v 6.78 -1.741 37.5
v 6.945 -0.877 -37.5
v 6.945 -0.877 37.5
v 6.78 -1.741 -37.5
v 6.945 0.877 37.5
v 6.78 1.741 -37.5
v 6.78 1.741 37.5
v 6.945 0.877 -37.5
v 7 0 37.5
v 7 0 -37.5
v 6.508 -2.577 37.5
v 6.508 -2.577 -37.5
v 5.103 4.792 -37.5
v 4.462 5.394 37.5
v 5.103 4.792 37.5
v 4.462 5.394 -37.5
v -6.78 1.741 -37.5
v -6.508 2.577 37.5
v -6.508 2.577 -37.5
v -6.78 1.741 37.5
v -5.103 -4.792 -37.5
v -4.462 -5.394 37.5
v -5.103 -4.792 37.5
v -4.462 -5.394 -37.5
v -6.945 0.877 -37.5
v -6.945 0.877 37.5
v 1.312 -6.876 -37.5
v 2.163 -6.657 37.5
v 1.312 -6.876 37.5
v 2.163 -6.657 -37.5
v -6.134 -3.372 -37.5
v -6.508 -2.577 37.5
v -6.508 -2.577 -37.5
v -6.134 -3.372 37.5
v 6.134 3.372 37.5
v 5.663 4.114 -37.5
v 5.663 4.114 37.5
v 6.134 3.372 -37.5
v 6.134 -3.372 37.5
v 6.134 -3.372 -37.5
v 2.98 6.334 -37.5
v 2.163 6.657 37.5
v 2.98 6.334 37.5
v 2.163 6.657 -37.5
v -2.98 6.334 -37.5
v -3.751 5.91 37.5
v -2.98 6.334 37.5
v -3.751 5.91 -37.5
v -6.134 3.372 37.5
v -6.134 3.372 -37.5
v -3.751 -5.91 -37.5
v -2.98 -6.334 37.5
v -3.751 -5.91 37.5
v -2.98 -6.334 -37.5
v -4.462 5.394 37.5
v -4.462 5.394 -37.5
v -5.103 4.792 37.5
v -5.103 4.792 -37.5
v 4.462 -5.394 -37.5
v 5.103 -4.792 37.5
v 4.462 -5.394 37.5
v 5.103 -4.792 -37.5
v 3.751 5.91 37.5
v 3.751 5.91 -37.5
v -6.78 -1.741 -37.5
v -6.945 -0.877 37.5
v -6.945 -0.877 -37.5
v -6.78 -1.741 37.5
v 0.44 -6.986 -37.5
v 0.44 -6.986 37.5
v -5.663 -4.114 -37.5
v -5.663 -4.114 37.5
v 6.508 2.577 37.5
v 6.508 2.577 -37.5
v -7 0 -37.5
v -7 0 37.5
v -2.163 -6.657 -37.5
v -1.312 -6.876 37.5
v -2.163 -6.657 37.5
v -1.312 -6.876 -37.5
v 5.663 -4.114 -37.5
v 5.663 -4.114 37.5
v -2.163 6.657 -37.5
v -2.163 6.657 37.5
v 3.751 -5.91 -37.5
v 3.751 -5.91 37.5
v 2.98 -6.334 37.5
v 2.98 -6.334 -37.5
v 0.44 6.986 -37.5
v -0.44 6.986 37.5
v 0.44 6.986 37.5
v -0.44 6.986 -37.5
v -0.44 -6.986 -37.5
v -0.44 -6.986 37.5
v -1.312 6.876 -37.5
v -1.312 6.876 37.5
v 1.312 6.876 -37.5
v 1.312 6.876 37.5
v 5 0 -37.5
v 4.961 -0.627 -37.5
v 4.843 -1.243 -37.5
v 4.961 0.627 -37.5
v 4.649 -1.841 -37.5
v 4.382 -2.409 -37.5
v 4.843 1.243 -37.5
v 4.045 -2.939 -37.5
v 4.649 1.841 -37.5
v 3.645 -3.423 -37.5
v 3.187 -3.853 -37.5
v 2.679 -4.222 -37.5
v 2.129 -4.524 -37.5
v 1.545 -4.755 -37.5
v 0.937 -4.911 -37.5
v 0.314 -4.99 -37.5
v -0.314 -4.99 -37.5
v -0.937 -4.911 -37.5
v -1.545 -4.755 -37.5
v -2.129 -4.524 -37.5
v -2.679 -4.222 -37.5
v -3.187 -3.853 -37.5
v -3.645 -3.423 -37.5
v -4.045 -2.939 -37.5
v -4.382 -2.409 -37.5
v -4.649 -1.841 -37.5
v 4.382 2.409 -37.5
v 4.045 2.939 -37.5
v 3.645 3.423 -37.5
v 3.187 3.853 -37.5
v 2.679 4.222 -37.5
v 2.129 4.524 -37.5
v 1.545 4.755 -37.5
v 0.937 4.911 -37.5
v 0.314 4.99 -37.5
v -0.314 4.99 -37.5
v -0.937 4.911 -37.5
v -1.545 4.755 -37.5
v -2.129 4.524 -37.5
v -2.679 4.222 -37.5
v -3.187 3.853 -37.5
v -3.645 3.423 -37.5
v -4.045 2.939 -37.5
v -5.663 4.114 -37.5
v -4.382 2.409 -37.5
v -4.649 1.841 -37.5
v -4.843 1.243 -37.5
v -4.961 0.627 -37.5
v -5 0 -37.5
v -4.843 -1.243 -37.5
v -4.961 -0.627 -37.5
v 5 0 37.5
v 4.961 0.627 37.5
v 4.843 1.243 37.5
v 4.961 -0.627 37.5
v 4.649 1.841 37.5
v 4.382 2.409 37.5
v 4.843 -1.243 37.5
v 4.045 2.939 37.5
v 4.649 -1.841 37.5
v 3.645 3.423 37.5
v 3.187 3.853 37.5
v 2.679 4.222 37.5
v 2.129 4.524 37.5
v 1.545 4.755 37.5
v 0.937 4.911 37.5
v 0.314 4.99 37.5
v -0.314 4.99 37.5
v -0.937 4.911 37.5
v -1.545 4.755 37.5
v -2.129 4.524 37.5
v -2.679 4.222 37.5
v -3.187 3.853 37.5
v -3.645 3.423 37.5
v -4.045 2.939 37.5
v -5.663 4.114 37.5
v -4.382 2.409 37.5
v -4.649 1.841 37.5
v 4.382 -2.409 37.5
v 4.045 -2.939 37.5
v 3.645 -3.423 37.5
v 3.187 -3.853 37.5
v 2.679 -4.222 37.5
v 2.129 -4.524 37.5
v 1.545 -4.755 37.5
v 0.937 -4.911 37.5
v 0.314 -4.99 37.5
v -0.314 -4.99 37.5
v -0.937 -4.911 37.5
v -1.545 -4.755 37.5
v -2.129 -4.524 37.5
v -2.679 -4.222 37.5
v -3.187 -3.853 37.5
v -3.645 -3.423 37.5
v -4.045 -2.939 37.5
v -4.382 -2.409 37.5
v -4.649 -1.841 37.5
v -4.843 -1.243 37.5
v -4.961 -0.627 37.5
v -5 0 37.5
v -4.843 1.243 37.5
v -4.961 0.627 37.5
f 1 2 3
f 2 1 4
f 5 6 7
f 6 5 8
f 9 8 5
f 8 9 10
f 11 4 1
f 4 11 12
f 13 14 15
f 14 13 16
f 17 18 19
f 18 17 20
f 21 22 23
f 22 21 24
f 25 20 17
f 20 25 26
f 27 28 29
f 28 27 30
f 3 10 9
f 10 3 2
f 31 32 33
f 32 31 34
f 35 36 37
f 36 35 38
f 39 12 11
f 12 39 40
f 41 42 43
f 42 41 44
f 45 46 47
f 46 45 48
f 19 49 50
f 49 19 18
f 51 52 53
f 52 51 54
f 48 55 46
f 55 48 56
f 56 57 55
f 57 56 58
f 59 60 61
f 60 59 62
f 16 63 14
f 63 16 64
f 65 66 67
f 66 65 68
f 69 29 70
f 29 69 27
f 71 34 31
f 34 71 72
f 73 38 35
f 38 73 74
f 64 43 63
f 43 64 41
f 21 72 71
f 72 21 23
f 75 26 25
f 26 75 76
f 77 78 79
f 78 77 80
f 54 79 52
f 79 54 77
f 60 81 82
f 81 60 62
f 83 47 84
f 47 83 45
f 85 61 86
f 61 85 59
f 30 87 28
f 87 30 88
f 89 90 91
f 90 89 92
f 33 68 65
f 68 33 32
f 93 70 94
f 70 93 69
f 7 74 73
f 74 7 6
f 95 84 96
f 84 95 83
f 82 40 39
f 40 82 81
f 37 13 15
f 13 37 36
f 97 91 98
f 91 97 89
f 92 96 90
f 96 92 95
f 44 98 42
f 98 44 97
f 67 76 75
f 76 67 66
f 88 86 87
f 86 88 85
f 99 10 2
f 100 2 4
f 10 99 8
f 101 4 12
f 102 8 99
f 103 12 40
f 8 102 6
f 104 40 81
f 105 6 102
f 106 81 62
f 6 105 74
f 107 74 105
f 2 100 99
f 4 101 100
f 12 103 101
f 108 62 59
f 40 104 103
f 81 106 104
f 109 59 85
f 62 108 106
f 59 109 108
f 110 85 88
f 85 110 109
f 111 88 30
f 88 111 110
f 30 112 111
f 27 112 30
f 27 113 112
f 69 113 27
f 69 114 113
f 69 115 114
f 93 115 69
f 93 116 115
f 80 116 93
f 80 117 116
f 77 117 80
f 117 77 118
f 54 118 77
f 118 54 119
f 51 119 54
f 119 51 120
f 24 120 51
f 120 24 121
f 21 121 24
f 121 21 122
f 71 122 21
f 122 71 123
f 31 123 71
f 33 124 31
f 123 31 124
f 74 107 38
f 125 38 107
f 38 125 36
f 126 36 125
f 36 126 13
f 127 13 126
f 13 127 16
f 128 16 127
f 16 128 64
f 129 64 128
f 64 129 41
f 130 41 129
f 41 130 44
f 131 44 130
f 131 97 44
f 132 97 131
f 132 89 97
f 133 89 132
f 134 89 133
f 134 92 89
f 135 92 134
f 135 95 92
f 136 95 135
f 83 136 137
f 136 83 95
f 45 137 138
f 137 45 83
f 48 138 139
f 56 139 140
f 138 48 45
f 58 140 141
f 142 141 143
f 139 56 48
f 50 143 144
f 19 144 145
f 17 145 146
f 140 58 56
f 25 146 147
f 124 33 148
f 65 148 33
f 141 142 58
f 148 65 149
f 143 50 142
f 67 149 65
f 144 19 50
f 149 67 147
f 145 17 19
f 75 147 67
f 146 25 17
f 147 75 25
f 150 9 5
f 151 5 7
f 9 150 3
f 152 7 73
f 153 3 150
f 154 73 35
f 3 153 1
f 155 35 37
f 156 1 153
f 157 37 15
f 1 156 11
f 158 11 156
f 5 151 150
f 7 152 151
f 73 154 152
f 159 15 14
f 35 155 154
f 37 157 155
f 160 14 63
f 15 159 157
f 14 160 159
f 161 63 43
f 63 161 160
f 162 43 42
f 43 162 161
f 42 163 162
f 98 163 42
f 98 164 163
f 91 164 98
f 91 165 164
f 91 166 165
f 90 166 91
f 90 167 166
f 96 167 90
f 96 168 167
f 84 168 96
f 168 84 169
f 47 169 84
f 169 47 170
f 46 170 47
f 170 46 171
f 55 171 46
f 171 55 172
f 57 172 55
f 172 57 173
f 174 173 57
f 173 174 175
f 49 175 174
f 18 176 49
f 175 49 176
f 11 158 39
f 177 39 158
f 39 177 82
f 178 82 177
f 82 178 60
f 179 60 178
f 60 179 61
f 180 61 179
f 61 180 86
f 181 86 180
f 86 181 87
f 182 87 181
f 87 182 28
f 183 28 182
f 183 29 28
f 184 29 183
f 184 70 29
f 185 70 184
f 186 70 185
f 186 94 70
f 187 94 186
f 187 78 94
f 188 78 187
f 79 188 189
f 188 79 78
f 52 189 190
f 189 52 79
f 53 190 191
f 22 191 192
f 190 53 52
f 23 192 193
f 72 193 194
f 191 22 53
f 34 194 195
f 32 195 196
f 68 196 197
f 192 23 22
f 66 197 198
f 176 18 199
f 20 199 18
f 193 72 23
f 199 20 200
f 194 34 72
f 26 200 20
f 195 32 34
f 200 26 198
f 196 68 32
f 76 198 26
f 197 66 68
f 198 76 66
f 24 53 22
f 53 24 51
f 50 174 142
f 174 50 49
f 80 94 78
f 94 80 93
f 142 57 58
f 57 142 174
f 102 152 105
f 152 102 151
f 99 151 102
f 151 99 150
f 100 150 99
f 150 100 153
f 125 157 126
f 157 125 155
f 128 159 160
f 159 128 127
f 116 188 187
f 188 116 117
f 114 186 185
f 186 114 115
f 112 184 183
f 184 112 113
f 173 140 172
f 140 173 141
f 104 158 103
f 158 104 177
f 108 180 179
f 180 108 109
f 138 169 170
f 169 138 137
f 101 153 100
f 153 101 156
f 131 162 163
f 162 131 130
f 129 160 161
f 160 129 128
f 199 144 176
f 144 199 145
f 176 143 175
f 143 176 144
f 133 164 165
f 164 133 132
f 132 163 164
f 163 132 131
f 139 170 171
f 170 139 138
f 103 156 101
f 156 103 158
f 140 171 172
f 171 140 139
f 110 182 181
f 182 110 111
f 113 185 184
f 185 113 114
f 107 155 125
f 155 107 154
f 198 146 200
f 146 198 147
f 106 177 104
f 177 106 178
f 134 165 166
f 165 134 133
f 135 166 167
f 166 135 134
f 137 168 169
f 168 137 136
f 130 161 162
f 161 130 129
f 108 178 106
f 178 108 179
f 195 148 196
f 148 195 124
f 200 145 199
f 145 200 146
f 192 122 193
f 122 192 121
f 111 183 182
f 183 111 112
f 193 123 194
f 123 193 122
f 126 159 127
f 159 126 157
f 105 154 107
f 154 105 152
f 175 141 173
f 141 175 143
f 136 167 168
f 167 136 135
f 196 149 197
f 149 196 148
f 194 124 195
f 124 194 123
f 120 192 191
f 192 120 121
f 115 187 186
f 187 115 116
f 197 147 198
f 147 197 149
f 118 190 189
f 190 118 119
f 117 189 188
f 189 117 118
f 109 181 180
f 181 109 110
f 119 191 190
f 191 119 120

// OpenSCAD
$fn = 50;


difference() {
	union() {
		translate(v = [0, 0, -37.5000000000]) {
			cylinder(h = 75, r = 7.0000000000);
		}
	}
	union() {
		translate(v = [0, 0, -100.0000000000]) {
			cylinder(h = 200, r = 5.0000000000);
		}
	}
}
